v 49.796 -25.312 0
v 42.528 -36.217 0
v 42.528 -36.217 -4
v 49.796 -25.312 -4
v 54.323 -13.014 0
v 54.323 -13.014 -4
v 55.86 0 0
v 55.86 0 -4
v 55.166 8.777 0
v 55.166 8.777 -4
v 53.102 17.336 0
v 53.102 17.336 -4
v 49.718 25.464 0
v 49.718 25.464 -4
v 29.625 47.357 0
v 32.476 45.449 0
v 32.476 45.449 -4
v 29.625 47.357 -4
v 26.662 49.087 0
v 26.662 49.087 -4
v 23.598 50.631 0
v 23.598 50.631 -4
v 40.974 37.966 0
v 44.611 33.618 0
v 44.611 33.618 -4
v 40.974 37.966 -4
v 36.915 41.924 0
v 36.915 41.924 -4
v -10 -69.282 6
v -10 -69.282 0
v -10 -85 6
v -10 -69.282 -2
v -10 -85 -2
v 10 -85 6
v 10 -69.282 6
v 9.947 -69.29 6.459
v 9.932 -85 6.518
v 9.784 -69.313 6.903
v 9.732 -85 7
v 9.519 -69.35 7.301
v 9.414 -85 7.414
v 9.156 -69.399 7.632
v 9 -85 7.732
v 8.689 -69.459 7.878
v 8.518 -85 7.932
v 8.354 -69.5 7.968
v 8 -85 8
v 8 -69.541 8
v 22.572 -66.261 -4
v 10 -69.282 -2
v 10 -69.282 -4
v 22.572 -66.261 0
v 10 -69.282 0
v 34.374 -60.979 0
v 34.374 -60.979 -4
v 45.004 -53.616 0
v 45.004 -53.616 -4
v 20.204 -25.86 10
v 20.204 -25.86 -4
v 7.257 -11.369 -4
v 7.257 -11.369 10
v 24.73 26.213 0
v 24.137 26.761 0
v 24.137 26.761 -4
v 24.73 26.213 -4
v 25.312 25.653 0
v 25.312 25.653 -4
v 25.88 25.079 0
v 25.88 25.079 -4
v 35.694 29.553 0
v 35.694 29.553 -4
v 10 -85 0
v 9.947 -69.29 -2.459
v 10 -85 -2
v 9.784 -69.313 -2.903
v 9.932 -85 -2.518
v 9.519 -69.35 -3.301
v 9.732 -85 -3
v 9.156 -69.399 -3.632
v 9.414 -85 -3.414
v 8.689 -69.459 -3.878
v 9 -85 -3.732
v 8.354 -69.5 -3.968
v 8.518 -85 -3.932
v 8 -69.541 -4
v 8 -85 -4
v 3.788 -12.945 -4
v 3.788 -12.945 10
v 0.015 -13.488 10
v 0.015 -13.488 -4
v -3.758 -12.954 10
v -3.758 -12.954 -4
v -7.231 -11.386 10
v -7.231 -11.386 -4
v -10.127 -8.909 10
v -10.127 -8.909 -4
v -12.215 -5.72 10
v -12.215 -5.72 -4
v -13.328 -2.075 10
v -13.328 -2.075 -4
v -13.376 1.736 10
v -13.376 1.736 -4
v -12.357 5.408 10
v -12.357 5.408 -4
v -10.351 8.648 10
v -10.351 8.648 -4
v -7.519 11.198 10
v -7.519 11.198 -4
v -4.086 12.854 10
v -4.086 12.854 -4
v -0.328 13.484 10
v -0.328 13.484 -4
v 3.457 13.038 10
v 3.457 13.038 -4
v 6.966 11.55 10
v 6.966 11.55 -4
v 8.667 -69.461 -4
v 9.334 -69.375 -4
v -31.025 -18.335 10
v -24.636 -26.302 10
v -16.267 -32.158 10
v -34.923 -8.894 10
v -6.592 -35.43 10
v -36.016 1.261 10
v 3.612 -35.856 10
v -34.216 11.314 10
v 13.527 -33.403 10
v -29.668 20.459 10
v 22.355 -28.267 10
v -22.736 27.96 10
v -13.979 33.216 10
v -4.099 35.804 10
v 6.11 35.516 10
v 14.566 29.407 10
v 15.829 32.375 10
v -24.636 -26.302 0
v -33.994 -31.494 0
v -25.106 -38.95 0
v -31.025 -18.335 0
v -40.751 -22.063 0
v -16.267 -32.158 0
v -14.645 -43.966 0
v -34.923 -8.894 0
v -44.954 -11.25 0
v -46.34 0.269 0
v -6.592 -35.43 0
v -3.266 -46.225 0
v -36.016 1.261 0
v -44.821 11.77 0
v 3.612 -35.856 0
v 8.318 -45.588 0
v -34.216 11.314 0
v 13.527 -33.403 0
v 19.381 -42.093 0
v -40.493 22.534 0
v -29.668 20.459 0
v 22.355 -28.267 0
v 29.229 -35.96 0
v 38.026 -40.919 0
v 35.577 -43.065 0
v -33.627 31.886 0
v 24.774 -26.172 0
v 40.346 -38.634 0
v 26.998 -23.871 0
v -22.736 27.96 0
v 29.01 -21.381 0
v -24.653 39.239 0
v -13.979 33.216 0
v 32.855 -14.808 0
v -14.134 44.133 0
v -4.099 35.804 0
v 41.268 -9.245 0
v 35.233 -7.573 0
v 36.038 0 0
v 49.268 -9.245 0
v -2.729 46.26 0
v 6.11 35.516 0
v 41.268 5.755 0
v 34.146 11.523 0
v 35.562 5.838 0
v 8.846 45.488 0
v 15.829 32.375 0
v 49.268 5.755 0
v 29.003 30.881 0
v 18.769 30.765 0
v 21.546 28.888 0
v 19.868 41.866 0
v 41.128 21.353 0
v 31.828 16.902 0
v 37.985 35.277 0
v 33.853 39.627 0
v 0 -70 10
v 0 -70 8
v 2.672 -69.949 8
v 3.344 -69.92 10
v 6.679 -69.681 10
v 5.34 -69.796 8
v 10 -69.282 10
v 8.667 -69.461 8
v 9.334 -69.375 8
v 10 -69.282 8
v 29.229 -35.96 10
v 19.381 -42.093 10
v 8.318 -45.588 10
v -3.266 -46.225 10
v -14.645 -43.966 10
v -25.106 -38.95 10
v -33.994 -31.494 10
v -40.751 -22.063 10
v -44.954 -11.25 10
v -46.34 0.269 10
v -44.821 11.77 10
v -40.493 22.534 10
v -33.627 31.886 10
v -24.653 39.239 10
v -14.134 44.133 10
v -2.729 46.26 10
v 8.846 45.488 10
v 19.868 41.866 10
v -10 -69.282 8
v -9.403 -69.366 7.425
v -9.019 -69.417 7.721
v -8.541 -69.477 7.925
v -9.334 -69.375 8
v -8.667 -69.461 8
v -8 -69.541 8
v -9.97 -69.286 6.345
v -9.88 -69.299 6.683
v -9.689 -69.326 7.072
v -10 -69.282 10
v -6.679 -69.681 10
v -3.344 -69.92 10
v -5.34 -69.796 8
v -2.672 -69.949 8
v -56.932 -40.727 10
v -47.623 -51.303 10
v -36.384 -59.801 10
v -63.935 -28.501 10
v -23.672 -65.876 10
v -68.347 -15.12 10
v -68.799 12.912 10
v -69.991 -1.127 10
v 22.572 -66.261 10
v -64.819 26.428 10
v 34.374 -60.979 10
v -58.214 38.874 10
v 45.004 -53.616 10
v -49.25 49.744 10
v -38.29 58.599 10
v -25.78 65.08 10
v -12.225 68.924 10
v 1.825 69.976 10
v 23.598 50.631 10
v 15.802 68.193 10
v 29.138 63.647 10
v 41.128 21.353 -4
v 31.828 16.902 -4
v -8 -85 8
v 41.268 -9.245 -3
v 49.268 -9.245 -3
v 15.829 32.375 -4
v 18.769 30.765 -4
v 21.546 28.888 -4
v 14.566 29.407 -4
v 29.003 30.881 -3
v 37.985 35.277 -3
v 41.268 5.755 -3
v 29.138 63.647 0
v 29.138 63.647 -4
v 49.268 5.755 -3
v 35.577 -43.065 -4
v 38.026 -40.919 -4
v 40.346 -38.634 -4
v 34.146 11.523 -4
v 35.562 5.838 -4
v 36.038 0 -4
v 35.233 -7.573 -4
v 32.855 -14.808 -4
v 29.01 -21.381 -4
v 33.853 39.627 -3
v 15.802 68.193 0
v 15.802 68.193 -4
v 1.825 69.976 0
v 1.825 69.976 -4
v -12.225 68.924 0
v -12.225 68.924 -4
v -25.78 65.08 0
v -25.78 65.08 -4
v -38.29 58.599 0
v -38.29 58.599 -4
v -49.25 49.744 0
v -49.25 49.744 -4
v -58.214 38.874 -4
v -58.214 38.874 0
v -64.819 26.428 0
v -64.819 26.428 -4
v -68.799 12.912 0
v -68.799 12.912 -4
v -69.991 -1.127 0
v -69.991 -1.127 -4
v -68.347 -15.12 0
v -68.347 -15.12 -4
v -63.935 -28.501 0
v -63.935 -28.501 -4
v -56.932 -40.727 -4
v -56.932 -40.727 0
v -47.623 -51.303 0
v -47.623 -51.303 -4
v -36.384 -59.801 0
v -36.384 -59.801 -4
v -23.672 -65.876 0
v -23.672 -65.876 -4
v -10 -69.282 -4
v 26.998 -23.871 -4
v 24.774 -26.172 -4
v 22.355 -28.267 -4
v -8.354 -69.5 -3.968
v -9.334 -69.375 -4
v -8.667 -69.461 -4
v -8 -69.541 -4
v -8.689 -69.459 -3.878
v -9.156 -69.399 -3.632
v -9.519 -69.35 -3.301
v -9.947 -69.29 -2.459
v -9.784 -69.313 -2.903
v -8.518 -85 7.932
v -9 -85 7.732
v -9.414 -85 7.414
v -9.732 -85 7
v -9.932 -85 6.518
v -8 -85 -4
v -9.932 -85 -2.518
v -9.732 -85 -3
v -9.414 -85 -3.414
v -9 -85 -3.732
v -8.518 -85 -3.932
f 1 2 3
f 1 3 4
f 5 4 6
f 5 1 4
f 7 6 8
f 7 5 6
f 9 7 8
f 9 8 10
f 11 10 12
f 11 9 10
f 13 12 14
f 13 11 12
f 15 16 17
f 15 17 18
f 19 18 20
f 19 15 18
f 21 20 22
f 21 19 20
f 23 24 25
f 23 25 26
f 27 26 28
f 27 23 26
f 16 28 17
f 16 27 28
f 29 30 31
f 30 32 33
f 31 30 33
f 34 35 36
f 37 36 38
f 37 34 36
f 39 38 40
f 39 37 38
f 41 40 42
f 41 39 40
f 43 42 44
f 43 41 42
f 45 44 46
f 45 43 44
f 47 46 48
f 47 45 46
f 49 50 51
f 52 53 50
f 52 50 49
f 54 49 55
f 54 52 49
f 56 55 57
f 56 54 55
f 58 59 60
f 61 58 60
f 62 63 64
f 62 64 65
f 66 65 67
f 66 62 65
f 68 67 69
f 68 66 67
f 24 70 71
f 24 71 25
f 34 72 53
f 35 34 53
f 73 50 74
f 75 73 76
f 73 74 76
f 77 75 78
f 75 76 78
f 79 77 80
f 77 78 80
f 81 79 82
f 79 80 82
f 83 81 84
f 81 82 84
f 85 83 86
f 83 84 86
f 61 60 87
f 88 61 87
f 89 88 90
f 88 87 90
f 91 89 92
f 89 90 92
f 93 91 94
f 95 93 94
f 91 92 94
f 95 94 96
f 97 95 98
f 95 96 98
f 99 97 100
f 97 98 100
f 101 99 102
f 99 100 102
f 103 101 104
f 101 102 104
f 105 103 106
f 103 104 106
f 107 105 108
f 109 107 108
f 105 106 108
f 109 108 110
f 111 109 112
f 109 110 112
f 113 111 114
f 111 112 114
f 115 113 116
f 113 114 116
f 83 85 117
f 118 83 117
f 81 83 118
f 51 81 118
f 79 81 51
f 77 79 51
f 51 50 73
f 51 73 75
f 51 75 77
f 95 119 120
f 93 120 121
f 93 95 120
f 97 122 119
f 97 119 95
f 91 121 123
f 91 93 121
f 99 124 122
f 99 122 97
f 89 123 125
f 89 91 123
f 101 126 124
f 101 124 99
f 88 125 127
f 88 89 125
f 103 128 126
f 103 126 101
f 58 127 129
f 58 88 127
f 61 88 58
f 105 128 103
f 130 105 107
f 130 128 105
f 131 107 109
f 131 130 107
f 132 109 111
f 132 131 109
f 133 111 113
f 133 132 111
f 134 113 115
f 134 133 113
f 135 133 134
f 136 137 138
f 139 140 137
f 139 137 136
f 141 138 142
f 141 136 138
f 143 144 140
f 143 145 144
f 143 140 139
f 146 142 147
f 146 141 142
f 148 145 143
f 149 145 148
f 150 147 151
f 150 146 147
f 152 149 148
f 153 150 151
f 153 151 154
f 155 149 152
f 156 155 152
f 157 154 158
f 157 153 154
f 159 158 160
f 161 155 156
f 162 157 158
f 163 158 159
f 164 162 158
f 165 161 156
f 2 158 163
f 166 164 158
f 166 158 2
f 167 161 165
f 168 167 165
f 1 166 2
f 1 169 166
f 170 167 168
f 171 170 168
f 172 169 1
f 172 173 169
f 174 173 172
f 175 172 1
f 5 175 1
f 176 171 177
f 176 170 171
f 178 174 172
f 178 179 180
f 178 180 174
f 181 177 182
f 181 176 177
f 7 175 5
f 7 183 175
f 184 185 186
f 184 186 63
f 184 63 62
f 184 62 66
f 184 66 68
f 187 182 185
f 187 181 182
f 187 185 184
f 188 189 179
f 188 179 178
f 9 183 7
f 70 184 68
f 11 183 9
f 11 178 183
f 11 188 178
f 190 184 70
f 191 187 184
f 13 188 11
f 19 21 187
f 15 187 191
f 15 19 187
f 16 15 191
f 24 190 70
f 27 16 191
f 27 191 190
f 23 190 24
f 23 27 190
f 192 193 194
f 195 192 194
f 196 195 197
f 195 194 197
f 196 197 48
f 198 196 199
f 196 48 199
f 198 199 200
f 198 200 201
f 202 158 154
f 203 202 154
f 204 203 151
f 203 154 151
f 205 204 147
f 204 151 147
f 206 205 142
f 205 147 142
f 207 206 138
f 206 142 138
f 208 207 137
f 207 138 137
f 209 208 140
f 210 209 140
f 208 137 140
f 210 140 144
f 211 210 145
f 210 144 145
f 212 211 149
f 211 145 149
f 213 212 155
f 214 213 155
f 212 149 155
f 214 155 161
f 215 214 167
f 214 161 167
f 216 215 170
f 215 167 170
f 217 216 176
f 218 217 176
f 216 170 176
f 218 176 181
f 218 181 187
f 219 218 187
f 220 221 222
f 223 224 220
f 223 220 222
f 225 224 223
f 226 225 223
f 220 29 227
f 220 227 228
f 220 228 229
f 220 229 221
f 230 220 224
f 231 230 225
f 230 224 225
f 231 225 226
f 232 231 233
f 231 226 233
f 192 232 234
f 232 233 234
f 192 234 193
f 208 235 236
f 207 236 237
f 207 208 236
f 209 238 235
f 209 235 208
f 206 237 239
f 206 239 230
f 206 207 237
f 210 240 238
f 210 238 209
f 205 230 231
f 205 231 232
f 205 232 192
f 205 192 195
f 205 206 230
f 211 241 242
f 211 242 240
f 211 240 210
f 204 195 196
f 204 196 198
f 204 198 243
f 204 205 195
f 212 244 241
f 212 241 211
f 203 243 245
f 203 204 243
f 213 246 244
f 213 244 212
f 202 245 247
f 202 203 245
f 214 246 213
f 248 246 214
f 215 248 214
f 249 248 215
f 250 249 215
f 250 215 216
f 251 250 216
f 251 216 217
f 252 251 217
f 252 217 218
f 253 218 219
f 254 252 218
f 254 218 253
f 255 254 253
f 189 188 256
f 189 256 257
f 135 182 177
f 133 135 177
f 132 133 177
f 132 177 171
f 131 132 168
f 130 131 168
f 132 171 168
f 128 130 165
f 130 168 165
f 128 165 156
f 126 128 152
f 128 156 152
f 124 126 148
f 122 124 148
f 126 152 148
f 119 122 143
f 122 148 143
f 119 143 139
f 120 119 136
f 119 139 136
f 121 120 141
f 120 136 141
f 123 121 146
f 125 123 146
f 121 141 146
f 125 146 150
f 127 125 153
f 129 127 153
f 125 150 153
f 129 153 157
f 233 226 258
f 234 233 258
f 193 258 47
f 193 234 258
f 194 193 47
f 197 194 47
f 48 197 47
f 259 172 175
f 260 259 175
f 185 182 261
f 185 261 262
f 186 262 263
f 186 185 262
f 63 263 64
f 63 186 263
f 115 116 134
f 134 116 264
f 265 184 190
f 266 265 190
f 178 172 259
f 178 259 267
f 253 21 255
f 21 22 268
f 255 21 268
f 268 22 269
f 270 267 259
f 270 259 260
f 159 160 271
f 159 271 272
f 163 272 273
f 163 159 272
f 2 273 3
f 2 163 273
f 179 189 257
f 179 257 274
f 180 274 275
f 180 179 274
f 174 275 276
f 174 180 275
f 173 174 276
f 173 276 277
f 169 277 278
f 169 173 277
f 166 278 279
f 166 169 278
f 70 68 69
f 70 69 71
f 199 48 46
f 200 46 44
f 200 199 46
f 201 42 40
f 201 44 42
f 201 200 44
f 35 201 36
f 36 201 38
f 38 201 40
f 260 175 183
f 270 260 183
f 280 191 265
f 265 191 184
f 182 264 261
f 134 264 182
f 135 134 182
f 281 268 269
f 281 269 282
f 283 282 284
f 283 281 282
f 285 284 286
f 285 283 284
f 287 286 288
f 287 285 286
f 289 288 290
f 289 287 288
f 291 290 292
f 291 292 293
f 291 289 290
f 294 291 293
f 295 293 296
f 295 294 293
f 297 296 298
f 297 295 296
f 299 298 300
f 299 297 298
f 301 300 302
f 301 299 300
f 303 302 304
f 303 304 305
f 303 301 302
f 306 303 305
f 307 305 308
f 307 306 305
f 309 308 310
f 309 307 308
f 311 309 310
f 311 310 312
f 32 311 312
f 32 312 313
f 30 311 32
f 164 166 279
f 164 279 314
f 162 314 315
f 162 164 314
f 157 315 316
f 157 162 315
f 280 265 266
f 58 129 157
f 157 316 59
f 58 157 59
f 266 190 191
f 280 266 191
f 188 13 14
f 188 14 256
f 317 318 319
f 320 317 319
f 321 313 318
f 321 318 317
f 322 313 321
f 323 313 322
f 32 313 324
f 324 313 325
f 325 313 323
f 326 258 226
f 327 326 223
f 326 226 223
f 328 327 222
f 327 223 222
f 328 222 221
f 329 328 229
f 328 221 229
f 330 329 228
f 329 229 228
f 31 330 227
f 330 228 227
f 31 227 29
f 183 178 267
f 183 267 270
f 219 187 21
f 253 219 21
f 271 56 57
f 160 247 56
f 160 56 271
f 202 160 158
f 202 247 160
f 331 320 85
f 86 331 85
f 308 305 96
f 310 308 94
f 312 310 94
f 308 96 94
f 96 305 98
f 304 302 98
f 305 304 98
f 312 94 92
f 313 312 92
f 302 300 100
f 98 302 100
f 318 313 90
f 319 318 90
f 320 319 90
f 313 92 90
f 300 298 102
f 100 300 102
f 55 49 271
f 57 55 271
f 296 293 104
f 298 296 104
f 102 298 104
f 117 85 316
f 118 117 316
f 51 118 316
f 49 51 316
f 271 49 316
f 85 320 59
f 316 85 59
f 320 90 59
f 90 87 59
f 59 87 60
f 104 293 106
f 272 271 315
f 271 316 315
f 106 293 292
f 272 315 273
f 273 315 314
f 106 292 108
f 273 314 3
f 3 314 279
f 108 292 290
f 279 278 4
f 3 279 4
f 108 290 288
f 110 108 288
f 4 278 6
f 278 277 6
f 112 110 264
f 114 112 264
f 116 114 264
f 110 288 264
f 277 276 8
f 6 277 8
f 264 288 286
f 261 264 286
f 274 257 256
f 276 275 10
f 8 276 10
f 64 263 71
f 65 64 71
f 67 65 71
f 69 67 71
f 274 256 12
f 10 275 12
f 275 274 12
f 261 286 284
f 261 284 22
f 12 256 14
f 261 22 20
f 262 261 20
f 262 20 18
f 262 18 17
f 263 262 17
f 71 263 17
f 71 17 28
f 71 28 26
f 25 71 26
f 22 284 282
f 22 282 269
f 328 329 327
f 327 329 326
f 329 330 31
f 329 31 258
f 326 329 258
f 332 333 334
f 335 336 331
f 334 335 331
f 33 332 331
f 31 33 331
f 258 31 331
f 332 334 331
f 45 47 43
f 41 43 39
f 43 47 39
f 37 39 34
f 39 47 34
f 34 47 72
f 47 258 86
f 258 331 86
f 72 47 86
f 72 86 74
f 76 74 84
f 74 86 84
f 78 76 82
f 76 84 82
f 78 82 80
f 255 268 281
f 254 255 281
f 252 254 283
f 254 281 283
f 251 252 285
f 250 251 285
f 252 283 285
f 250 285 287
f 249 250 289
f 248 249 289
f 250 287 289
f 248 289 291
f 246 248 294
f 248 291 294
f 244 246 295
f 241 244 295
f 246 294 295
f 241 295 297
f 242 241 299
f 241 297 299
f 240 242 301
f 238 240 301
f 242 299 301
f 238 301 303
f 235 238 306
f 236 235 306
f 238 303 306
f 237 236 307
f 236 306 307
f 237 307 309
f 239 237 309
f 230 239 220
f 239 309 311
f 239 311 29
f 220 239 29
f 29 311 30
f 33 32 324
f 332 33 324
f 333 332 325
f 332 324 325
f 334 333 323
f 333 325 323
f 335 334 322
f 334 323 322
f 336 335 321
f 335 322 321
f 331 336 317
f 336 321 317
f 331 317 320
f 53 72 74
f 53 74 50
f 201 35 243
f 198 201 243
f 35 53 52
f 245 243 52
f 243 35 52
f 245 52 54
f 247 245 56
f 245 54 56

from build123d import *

# Parameters (mm, degrees)
F1_DEPTH     = 4
F2_DEPTH     = 10
F3_W         = 8
F3_H         = 15
F4_DEPTH     = 3
F5_DEPTH     = 4
F6_DEPTH     = 8
F7_T4_DEPTH  = 25.7179676972
F7_S5_R      = 70
F7_T6_DEPTH  = 14
F7_T10_DEPTH = 25.7179676972
F7_S11_R     = 70
F7_T12_DEPTH = 14
F7_T16_DEPTH = 25.7179676972
F7_S17_R     = 70
F7_T18_DEPTH = 14
F7_T22_DEPTH = 25.7179676972
F7_S23_R     = 70
F7_T24_DEPTH = 14


# Not quite as in the source:
# - a fillet or chamfer that OpenCascade refuses, or shapes differently, is made with other operations: its cross-section is extruded or revolved along the edge and cut away or added


with BuildPart() as f1:
    # F0 (on Top) → F1 (new body)
    with BuildSketch(Plane.XY):
        with BuildLine():
            Line((23.5981723771, 50.6307036507), (29.1379201291, 63.6473221004))
            ThreePointArc((29.1379201291, 63.6473221004), (-67.1499688178, 19.7707280537), (-10, -69.2820323028))
            ThreePointArc((-10, -69.2820323028), (-5.0128703757, -69.8202773598), (0, -70))
            ThreePointArc((0, -70), (5.0128703757, -69.8202773598), (10, -69.2820323028))
            ThreePointArc((10, -69.2820323028), (28.5954871466, -63.89286435), (45.0035054679, -53.6160842994))
            Line((45.0035054679, -53.6160842994), (35.576841855, -43.0654178585))
            ThreePointArc((35.576841855, -43.0654178585), (-55.4090369327, -7.0838208542), (23.5981723771, 50.6307036507))
        make_face()
        with BuildLine():
            Line((19.8677907274, 41.8655113026), (23.5981723771, 50.6307036507))
            ThreePointArc((23.5981723771, 50.6307036507), (-55.4090369327, -7.0838208542), (35.576841855, -43.0654178585))
            Line((35.576841855, -43.0654178585), (29.2286049616, -35.9602391123))
            ThreePointArc((29.2286049616, -35.9602391123), (-46.0089760191, -5.5339200114), (19.8677907274, 41.8655113026))
        make_face()
        with BuildLine():
            Line((14.5657325798, 29.407386674), (15.8289323737, 32.3754983065))
            ThreePointArc((15.8289323737, 32.3754983065), (-35.8310083049, -3.8557534328), (22.3545915501, -28.266592071))
            Line((22.3545915501, -28.266592071), (20.2043653008, -25.8599802663))
            ThreePointArc((20.2043653008, -25.8599802663), (-32.6475173449, -3.3308509117), (14.5657325798, 29.407386674))
        make_face()
        with BuildLine():
            Line((6.9658582886, 11.5501360659), (14.5657325798, 29.407386674))
            ThreePointArc((14.5657325798, 29.407386674), (-32.6475173449, -3.3308509117), (20.2043653008, -25.8599802663))
            Line((20.2043653008, -25.8599802663), (7.257370403, -11.3692303905))
            ThreePointArc((7.257370403, -11.3692303905), (-13.4870085006, -0.1715416686), (6.9658582886, 11.5501360659))
        make_face()
        with BuildLine():
            Line((15.8289323737, 32.3754983065), (19.8677907274, 41.8655113026))
            ThreePointArc((19.8677907274, 41.8655113026), (-46.0089760191, -5.5339200114), (29.2286049616, -35.9602391123))
            Line((29.2286049616, -35.9602391123), (22.3545915501, -28.266592071))
            ThreePointArc((22.3545915501, -28.266592071), (-35.8310083049, -3.8557534328), (15.8289323737, 32.3754983065))
        make_face()
        with BuildLine():
            ThreePointArc((32.4763517935, 45.4491855361), (28.1567060881, 48.2446037809), (23.5981723771, 50.6307036507))
            Line((23.5981723771, 50.6307036507), (19.8677907274, 41.8655113026))
            ThreePointArc((19.8677907274, 41.8655113026), (24.3303762174, 39.4396112828), (28.5006543682, 36.5398802079))
            Line((28.5006543682, 36.5398802079), (32.4763517935, 45.4491855361))
        make_face()
        with BuildLine():
            ThreePointArc((28.5006543682, 36.5398802079), (24.3303762174, 39.4396112828), (19.8677907274, 41.8655113026))
            Line((19.8677907274, 41.8655113026), (15.8289323737, 32.3754983065))
            ThreePointArc((15.8289323737, 32.3754983065), (20.1791178088, 29.8585196408), (24.1368343884, 26.7608149426))
            Line((24.1368343884, 26.7608149426), (28.5006543682, 36.5398802079))
        make_face()
        with BuildLine():
            ThreePointArc((35.6941134, 29.5530102292), (32.2869345127, 33.2416005149), (28.5006543682, 36.5398802079))
            Line((28.5006543682, 36.5398802079), (24.1368343884, 26.7608149426))
            ThreePointArc((24.1368343884, 26.7608149426), (25.022522536, 25.9345591175), (25.8799433339, 25.0790056366))
            Line((25.8799433339, 25.0790056366), (35.6941134, 29.5530102292))
        make_face()
        with BuildLine():
            ThreePointArc((44.6112733376, 33.6180930885), (38.9951173125, 39.9965338185), (32.4763517935, 45.4491855361))
            Line((32.4763517935, 45.4491855361), (28.5006543682, 36.5398802079))
            ThreePointArc((28.5006543682, 36.5398802079), (32.2869345127, 33.2416005149), (35.6941134, 29.5530102292))
            Line((35.6941134, 29.5530102292), (44.6112733376, 33.6180930885))
        make_face()
        with BuildLine():
            Line((22.3545915501, -28.266592071), (29.2286049616, -35.9602391123))
            ThreePointArc((29.2286049616, -35.9602391123), (32.8206282453, -32.7147750505), (36.0544716862, -29.1122863487))
            Line((36.0544716862, -29.1122863487), (29.0097989093, -21.3812899032))
            ThreePointArc((29.0097989093, -21.3812899032), (25.9119084265, -25.0459775688), (22.3545915501, -28.266592071))
        make_face()
        with BuildLine():
            Line((29.2286049616, -35.9602391123), (35.576841855, -43.0654178585))
            ThreePointArc((35.576841855, -43.0654178585), (39.2024865114, -39.7933027409), (42.5284655631, -36.2170057923))
            Line((42.5284655631, -36.2170057923), (36.0544716862, -29.1122863487))
            ThreePointArc((36.0544716862, -29.1122863487), (32.8206282453, -32.7147750505), (29.2286049616, -35.9602391123))
        make_face()
        with BuildLine():
            Line((36.0544716862, -29.1122863487), (42.5284655631, -36.2170057923))
            ThreePointArc((42.5284655631, -36.2170057923), (52.4212879012, -19.2963848035), (55.860020513, 0))
            ThreePointArc((55.860020513, 0), (54.3029220862, 13.0971197067), (49.7184350628, 25.4640748234))
            Line((49.7184350628, 25.4640748234), (41.1278773135, 21.3529354587))
            ThreePointArc((41.1278773135, 21.3529354587), (45.0185527566, 10.9899978491), (46.3405885269, 0))
            ThreePointArc((46.3405885269, 0), (43.6934524957, -15.4380165186), (36.0544716862, -29.1122863487))
        make_face()
        with BuildLine():
            Line((29.0097989093, -21.3812899032), (36.0544716862, -29.1122863487))
            ThreePointArc((36.0544716862, -29.1122863487), (43.6934524957, -15.4380165186), (46.3405885269, 0))
            ThreePointArc((46.3405885269, 0), (45.0185527566, 10.9899978491), (41.1278773135, 21.3529354587))
            Line((41.1278773135, 21.3529354587), (31.8282165391, 16.9024442795))
            ThreePointArc((31.8282165391, 16.9024442795), (34.9696231307, 8.7093885424), (36.0378688421, 0))
            ThreePointArc((36.0378688421, 0), (34.2357950026, -11.253369772), (29.0097989093, -21.3812899032))
        make_face()
    extrude(amount=-F1_DEPTH)

    # F0 (on Top) → F2 (join)
    with BuildSketch(Plane.XY):
        with BuildLine():
            Line((23.5981723771, 50.6307036507), (29.1379201291, 63.6473221004))
            ThreePointArc((29.1379201291, 63.6473221004), (-67.1499688178, 19.7707280537), (-10, -69.2820323028))
            ThreePointArc((-10, -69.2820323028), (-5.0128703757, -69.8202773598), (0, -70))
            ThreePointArc((0, -70), (5.0128703757, -69.8202773598), (10, -69.2820323028))
            ThreePointArc((10, -69.2820323028), (28.5954871466, -63.89286435), (45.0035054679, -53.6160842994))
            Line((45.0035054679, -53.6160842994), (35.576841855, -43.0654178585))
            ThreePointArc((35.576841855, -43.0654178585), (-55.4090369327, -7.0838208542), (23.5981723771, 50.6307036507))
        make_face()
        with BuildLine():
            Line((19.8677907274, 41.8655113026), (23.5981723771, 50.6307036507))
            ThreePointArc((23.5981723771, 50.6307036507), (-55.4090369327, -7.0838208542), (35.576841855, -43.0654178585))
            Line((35.576841855, -43.0654178585), (29.2286049616, -35.9602391123))
            ThreePointArc((29.2286049616, -35.9602391123), (-46.0089760191, -5.5339200114), (19.8677907274, 41.8655113026))
        make_face()
        with BuildLine():
            Line((6.9658582886, 11.5501360659), (14.5657325798, 29.407386674))
            ThreePointArc((14.5657325798, 29.407386674), (-32.6475173449, -3.3308509117), (20.2043653008, -25.8599802663))
            Line((20.2043653008, -25.8599802663), (7.257370403, -11.3692303905))
            ThreePointArc((7.257370403, -11.3692303905), (-13.4870085006, -0.1715416686), (6.9658582886, 11.5501360659))
        make_face()
        with BuildLine():
            Line((14.5657325798, 29.407386674), (15.8289323737, 32.3754983065))
            ThreePointArc((15.8289323737, 32.3754983065), (-35.8310083049, -3.8557534328), (22.3545915501, -28.266592071))
            Line((22.3545915501, -28.266592071), (20.2043653008, -25.8599802663))
            ThreePointArc((20.2043653008, -25.8599802663), (-32.6475173449, -3.3308509117), (14.5657325798, 29.407386674))
        make_face()
    extrude(amount=F2_DEPTH)

    # F3 (on face) → F4 (cut)
    with BuildSketch(Plane.XY):
        Polygon((37.9851715346, 35.276671204), (33.8525412993, 39.626541011), (29.0030042003, 30.8811427968), align=None)
        with Locations((45.2681102753, -1.745258756)):
            Rectangle(F3_W, F3_H)
    extrude(amount=-F4_DEPTH, mode=Mode.SUBTRACT)

    # F0 (on Top) → F5 (join)
    with BuildSketch(Plane.XY):
        with BuildLine():
            ThreePointArc((0, -70), (-5.0128703757, -69.8202773598), (-10, -69.2820323028))
            Line((-10, -69.2820323028), (-10, -74.2803270693))
            ThreePointArc((-10, -74.2803270693), (-5.0112133817, -74.7827167864), (0, -74.9504302157))
            Line((0, -74.9504302157), (0, -70))
        make_face()
        with BuildLine():
            ThreePointArc((10, -69.2820323028), (5.0128703757, -69.8202773598), (0, -70))
            Line((0, -70), (0, -74.9504302157))
            ThreePointArc((0, -74.9504302157), (5.0112133817, -74.7827167864), (10, -74.2803270693))
            Line((10, -74.2803270693), (10, -69.2820323028))
        make_face()
        with BuildLine():
            ThreePointArc((10, -74.2803270693), (5.0112133817, -74.7827167864), (0, -74.9504302157))
            Line((0, -74.9504302157), (0, -85))
            Line((0, -85), (10, -85))
            Line((10, -85), (10, -74.2803270693))
        make_face()
        with BuildLine():
            ThreePointArc((0, -74.9504302157), (-5.0112133817, -74.7827167864), (-10, -74.2803270693))
            Line((-10, -74.2803270693), (-10, -85))
            Line((-10, -85), (0, -85))
            Line((0, -85), (0, -74.9504302157))
        make_face()
    extrude(amount=-F5_DEPTH)

    # F0 (on Top) → F6 (join)
    with BuildSketch(Plane.XY):
        with BuildLine():
            ThreePointArc((0, -70), (-5.0128703757, -69.8202773598), (-10, -69.2820323028))
            Line((-10, -69.2820323028), (-10, -74.2803270693))
            ThreePointArc((-10, -74.2803270693), (-5.0112133817, -74.7827167864), (0, -74.9504302157))
            Line((0, -74.9504302157), (0, -70))
        make_face()
        with BuildLine():
            ThreePointArc((0, -74.9504302157), (-5.0112133817, -74.7827167864), (-10, -74.2803270693))
            Line((-10, -74.2803270693), (-10, -85))
            Line((-10, -85), (0, -85))
            Line((0, -85), (0, -74.9504302157))
        make_face()
        with BuildLine():
            ThreePointArc((10, -69.2820323028), (5.0128703757, -69.8202773598), (0, -70))
            Line((0, -70), (0, -74.9504302157))
            ThreePointArc((0, -74.9504302157), (5.0112133817, -74.7827167864), (10, -74.2803270693))
            Line((10, -74.2803270693), (10, -69.2820323028))
        make_face()
        with BuildLine():
            ThreePointArc((10, -74.2803270693), (5.0112133817, -74.7827167864), (0, -74.9504302157))
            Line((0, -74.9504302157), (0, -85))
            Line((0, -85), (10, -85))
            Line((10, -85), (10, -74.2803270693))
        make_face()
    extrude(amount=F6_DEPTH)

    # F7: fillet of radius 2 on 4 edges, made by hand


with BuildPart() as f7_tool2:
    # F7_s3 → F7_t4 (new body)
    with BuildSketch(Plane.XZ.offset(90)):
        with BuildLine():
            ThreePointArc((10, 6), (9.4142135624, 7.4142135624), (8, 8))
            Line((8, 8), (10, 8))
            Line((10, 8), (10, 6))
        make_face()
    extrude(amount=-F7_T4_DEPTH)

    # F7_s5 → F7_t6 (cut, symmetric)
    with BuildSketch(Plane.XY.offset(7)):
        Circle(F7_S5_R)
    extrude(amount=F7_T6_DEPTH, both=True, mode=Mode.SUBTRACT)


with BuildPart() as f1_1:
    add(f1.part)

    # F7_t1: cut F7_tool2
    add(f7_tool2.part, mode=Mode.SUBTRACT)


with BuildPart() as f7_tool8:
    # F7_s9 → F7_t10 (new body)
    with BuildSketch(Plane.XZ.offset(64.2820323028)):
        with BuildLine():
            ThreePointArc((-8, 8), (-9.4142135624, 7.4142135624), (-10, 6))
            Line((-10, 6), (-10, 8))
            Line((-10, 8), (-8, 8))
        make_face()
    extrude(amount=F7_T10_DEPTH)

    # F7_s11 → F7_t12 (cut, symmetric)
    with BuildSketch(Plane.XY.offset(7)):
        Circle(F7_S11_R)
    extrude(amount=F7_T12_DEPTH, both=True, mode=Mode.SUBTRACT)


with BuildPart() as f1_2:
    add(f1_1.part)

    # F7_t7: cut F7_tool8
    add(f7_tool8.part, mode=Mode.SUBTRACT)


with BuildPart() as f7_tool14:
    # F7_s15 → F7_t16 (new body)
    with BuildSketch(Plane.XZ.offset(90)):
        with BuildLine():
            ThreePointArc((10, -2), (9.4142135624, -3.4142135624), (8, -4))
            Line((8, -4), (10, -4))
            Line((10, -4), (10, -2))
        make_face()
    extrude(amount=-F7_T16_DEPTH)

    # F7_s17 → F7_t18 (cut, symmetric)
    with BuildSketch(Plane.XY.offset(-3)):
        Circle(F7_S17_R)
    extrude(amount=F7_T18_DEPTH, both=True, mode=Mode.SUBTRACT)


with BuildPart() as f1_3:
    add(f1_2.part)

    # F7_t13: cut F7_tool14
    add(f7_tool14.part, mode=Mode.SUBTRACT)


with BuildPart() as f7_tool20:
    # F7_s21 → F7_t22 (new body)
    with BuildSketch(Plane.XZ.offset(64.2820323028)):
        with BuildLine():
            ThreePointArc((-10, -2), (-9.4142135624, -3.4142135624), (-8, -4))
            Line((-8, -4), (-10, -4))
            Line((-10, -4), (-10, -2))
        make_face()
    extrude(amount=F7_T22_DEPTH)

    # F7_s23 → F7_t24 (cut, symmetric)
    with BuildSketch(Plane.XY.offset(-3)):
        Circle(F7_S23_R)
    extrude(amount=F7_T24_DEPTH, both=True, mode=Mode.SUBTRACT)


with BuildPart() as f1_4:
    add(f1_3.part)

    # F7_t19: cut F7_tool20
    add(f7_tool20.part, mode=Mode.SUBTRACT)


solid = f1_4.part
